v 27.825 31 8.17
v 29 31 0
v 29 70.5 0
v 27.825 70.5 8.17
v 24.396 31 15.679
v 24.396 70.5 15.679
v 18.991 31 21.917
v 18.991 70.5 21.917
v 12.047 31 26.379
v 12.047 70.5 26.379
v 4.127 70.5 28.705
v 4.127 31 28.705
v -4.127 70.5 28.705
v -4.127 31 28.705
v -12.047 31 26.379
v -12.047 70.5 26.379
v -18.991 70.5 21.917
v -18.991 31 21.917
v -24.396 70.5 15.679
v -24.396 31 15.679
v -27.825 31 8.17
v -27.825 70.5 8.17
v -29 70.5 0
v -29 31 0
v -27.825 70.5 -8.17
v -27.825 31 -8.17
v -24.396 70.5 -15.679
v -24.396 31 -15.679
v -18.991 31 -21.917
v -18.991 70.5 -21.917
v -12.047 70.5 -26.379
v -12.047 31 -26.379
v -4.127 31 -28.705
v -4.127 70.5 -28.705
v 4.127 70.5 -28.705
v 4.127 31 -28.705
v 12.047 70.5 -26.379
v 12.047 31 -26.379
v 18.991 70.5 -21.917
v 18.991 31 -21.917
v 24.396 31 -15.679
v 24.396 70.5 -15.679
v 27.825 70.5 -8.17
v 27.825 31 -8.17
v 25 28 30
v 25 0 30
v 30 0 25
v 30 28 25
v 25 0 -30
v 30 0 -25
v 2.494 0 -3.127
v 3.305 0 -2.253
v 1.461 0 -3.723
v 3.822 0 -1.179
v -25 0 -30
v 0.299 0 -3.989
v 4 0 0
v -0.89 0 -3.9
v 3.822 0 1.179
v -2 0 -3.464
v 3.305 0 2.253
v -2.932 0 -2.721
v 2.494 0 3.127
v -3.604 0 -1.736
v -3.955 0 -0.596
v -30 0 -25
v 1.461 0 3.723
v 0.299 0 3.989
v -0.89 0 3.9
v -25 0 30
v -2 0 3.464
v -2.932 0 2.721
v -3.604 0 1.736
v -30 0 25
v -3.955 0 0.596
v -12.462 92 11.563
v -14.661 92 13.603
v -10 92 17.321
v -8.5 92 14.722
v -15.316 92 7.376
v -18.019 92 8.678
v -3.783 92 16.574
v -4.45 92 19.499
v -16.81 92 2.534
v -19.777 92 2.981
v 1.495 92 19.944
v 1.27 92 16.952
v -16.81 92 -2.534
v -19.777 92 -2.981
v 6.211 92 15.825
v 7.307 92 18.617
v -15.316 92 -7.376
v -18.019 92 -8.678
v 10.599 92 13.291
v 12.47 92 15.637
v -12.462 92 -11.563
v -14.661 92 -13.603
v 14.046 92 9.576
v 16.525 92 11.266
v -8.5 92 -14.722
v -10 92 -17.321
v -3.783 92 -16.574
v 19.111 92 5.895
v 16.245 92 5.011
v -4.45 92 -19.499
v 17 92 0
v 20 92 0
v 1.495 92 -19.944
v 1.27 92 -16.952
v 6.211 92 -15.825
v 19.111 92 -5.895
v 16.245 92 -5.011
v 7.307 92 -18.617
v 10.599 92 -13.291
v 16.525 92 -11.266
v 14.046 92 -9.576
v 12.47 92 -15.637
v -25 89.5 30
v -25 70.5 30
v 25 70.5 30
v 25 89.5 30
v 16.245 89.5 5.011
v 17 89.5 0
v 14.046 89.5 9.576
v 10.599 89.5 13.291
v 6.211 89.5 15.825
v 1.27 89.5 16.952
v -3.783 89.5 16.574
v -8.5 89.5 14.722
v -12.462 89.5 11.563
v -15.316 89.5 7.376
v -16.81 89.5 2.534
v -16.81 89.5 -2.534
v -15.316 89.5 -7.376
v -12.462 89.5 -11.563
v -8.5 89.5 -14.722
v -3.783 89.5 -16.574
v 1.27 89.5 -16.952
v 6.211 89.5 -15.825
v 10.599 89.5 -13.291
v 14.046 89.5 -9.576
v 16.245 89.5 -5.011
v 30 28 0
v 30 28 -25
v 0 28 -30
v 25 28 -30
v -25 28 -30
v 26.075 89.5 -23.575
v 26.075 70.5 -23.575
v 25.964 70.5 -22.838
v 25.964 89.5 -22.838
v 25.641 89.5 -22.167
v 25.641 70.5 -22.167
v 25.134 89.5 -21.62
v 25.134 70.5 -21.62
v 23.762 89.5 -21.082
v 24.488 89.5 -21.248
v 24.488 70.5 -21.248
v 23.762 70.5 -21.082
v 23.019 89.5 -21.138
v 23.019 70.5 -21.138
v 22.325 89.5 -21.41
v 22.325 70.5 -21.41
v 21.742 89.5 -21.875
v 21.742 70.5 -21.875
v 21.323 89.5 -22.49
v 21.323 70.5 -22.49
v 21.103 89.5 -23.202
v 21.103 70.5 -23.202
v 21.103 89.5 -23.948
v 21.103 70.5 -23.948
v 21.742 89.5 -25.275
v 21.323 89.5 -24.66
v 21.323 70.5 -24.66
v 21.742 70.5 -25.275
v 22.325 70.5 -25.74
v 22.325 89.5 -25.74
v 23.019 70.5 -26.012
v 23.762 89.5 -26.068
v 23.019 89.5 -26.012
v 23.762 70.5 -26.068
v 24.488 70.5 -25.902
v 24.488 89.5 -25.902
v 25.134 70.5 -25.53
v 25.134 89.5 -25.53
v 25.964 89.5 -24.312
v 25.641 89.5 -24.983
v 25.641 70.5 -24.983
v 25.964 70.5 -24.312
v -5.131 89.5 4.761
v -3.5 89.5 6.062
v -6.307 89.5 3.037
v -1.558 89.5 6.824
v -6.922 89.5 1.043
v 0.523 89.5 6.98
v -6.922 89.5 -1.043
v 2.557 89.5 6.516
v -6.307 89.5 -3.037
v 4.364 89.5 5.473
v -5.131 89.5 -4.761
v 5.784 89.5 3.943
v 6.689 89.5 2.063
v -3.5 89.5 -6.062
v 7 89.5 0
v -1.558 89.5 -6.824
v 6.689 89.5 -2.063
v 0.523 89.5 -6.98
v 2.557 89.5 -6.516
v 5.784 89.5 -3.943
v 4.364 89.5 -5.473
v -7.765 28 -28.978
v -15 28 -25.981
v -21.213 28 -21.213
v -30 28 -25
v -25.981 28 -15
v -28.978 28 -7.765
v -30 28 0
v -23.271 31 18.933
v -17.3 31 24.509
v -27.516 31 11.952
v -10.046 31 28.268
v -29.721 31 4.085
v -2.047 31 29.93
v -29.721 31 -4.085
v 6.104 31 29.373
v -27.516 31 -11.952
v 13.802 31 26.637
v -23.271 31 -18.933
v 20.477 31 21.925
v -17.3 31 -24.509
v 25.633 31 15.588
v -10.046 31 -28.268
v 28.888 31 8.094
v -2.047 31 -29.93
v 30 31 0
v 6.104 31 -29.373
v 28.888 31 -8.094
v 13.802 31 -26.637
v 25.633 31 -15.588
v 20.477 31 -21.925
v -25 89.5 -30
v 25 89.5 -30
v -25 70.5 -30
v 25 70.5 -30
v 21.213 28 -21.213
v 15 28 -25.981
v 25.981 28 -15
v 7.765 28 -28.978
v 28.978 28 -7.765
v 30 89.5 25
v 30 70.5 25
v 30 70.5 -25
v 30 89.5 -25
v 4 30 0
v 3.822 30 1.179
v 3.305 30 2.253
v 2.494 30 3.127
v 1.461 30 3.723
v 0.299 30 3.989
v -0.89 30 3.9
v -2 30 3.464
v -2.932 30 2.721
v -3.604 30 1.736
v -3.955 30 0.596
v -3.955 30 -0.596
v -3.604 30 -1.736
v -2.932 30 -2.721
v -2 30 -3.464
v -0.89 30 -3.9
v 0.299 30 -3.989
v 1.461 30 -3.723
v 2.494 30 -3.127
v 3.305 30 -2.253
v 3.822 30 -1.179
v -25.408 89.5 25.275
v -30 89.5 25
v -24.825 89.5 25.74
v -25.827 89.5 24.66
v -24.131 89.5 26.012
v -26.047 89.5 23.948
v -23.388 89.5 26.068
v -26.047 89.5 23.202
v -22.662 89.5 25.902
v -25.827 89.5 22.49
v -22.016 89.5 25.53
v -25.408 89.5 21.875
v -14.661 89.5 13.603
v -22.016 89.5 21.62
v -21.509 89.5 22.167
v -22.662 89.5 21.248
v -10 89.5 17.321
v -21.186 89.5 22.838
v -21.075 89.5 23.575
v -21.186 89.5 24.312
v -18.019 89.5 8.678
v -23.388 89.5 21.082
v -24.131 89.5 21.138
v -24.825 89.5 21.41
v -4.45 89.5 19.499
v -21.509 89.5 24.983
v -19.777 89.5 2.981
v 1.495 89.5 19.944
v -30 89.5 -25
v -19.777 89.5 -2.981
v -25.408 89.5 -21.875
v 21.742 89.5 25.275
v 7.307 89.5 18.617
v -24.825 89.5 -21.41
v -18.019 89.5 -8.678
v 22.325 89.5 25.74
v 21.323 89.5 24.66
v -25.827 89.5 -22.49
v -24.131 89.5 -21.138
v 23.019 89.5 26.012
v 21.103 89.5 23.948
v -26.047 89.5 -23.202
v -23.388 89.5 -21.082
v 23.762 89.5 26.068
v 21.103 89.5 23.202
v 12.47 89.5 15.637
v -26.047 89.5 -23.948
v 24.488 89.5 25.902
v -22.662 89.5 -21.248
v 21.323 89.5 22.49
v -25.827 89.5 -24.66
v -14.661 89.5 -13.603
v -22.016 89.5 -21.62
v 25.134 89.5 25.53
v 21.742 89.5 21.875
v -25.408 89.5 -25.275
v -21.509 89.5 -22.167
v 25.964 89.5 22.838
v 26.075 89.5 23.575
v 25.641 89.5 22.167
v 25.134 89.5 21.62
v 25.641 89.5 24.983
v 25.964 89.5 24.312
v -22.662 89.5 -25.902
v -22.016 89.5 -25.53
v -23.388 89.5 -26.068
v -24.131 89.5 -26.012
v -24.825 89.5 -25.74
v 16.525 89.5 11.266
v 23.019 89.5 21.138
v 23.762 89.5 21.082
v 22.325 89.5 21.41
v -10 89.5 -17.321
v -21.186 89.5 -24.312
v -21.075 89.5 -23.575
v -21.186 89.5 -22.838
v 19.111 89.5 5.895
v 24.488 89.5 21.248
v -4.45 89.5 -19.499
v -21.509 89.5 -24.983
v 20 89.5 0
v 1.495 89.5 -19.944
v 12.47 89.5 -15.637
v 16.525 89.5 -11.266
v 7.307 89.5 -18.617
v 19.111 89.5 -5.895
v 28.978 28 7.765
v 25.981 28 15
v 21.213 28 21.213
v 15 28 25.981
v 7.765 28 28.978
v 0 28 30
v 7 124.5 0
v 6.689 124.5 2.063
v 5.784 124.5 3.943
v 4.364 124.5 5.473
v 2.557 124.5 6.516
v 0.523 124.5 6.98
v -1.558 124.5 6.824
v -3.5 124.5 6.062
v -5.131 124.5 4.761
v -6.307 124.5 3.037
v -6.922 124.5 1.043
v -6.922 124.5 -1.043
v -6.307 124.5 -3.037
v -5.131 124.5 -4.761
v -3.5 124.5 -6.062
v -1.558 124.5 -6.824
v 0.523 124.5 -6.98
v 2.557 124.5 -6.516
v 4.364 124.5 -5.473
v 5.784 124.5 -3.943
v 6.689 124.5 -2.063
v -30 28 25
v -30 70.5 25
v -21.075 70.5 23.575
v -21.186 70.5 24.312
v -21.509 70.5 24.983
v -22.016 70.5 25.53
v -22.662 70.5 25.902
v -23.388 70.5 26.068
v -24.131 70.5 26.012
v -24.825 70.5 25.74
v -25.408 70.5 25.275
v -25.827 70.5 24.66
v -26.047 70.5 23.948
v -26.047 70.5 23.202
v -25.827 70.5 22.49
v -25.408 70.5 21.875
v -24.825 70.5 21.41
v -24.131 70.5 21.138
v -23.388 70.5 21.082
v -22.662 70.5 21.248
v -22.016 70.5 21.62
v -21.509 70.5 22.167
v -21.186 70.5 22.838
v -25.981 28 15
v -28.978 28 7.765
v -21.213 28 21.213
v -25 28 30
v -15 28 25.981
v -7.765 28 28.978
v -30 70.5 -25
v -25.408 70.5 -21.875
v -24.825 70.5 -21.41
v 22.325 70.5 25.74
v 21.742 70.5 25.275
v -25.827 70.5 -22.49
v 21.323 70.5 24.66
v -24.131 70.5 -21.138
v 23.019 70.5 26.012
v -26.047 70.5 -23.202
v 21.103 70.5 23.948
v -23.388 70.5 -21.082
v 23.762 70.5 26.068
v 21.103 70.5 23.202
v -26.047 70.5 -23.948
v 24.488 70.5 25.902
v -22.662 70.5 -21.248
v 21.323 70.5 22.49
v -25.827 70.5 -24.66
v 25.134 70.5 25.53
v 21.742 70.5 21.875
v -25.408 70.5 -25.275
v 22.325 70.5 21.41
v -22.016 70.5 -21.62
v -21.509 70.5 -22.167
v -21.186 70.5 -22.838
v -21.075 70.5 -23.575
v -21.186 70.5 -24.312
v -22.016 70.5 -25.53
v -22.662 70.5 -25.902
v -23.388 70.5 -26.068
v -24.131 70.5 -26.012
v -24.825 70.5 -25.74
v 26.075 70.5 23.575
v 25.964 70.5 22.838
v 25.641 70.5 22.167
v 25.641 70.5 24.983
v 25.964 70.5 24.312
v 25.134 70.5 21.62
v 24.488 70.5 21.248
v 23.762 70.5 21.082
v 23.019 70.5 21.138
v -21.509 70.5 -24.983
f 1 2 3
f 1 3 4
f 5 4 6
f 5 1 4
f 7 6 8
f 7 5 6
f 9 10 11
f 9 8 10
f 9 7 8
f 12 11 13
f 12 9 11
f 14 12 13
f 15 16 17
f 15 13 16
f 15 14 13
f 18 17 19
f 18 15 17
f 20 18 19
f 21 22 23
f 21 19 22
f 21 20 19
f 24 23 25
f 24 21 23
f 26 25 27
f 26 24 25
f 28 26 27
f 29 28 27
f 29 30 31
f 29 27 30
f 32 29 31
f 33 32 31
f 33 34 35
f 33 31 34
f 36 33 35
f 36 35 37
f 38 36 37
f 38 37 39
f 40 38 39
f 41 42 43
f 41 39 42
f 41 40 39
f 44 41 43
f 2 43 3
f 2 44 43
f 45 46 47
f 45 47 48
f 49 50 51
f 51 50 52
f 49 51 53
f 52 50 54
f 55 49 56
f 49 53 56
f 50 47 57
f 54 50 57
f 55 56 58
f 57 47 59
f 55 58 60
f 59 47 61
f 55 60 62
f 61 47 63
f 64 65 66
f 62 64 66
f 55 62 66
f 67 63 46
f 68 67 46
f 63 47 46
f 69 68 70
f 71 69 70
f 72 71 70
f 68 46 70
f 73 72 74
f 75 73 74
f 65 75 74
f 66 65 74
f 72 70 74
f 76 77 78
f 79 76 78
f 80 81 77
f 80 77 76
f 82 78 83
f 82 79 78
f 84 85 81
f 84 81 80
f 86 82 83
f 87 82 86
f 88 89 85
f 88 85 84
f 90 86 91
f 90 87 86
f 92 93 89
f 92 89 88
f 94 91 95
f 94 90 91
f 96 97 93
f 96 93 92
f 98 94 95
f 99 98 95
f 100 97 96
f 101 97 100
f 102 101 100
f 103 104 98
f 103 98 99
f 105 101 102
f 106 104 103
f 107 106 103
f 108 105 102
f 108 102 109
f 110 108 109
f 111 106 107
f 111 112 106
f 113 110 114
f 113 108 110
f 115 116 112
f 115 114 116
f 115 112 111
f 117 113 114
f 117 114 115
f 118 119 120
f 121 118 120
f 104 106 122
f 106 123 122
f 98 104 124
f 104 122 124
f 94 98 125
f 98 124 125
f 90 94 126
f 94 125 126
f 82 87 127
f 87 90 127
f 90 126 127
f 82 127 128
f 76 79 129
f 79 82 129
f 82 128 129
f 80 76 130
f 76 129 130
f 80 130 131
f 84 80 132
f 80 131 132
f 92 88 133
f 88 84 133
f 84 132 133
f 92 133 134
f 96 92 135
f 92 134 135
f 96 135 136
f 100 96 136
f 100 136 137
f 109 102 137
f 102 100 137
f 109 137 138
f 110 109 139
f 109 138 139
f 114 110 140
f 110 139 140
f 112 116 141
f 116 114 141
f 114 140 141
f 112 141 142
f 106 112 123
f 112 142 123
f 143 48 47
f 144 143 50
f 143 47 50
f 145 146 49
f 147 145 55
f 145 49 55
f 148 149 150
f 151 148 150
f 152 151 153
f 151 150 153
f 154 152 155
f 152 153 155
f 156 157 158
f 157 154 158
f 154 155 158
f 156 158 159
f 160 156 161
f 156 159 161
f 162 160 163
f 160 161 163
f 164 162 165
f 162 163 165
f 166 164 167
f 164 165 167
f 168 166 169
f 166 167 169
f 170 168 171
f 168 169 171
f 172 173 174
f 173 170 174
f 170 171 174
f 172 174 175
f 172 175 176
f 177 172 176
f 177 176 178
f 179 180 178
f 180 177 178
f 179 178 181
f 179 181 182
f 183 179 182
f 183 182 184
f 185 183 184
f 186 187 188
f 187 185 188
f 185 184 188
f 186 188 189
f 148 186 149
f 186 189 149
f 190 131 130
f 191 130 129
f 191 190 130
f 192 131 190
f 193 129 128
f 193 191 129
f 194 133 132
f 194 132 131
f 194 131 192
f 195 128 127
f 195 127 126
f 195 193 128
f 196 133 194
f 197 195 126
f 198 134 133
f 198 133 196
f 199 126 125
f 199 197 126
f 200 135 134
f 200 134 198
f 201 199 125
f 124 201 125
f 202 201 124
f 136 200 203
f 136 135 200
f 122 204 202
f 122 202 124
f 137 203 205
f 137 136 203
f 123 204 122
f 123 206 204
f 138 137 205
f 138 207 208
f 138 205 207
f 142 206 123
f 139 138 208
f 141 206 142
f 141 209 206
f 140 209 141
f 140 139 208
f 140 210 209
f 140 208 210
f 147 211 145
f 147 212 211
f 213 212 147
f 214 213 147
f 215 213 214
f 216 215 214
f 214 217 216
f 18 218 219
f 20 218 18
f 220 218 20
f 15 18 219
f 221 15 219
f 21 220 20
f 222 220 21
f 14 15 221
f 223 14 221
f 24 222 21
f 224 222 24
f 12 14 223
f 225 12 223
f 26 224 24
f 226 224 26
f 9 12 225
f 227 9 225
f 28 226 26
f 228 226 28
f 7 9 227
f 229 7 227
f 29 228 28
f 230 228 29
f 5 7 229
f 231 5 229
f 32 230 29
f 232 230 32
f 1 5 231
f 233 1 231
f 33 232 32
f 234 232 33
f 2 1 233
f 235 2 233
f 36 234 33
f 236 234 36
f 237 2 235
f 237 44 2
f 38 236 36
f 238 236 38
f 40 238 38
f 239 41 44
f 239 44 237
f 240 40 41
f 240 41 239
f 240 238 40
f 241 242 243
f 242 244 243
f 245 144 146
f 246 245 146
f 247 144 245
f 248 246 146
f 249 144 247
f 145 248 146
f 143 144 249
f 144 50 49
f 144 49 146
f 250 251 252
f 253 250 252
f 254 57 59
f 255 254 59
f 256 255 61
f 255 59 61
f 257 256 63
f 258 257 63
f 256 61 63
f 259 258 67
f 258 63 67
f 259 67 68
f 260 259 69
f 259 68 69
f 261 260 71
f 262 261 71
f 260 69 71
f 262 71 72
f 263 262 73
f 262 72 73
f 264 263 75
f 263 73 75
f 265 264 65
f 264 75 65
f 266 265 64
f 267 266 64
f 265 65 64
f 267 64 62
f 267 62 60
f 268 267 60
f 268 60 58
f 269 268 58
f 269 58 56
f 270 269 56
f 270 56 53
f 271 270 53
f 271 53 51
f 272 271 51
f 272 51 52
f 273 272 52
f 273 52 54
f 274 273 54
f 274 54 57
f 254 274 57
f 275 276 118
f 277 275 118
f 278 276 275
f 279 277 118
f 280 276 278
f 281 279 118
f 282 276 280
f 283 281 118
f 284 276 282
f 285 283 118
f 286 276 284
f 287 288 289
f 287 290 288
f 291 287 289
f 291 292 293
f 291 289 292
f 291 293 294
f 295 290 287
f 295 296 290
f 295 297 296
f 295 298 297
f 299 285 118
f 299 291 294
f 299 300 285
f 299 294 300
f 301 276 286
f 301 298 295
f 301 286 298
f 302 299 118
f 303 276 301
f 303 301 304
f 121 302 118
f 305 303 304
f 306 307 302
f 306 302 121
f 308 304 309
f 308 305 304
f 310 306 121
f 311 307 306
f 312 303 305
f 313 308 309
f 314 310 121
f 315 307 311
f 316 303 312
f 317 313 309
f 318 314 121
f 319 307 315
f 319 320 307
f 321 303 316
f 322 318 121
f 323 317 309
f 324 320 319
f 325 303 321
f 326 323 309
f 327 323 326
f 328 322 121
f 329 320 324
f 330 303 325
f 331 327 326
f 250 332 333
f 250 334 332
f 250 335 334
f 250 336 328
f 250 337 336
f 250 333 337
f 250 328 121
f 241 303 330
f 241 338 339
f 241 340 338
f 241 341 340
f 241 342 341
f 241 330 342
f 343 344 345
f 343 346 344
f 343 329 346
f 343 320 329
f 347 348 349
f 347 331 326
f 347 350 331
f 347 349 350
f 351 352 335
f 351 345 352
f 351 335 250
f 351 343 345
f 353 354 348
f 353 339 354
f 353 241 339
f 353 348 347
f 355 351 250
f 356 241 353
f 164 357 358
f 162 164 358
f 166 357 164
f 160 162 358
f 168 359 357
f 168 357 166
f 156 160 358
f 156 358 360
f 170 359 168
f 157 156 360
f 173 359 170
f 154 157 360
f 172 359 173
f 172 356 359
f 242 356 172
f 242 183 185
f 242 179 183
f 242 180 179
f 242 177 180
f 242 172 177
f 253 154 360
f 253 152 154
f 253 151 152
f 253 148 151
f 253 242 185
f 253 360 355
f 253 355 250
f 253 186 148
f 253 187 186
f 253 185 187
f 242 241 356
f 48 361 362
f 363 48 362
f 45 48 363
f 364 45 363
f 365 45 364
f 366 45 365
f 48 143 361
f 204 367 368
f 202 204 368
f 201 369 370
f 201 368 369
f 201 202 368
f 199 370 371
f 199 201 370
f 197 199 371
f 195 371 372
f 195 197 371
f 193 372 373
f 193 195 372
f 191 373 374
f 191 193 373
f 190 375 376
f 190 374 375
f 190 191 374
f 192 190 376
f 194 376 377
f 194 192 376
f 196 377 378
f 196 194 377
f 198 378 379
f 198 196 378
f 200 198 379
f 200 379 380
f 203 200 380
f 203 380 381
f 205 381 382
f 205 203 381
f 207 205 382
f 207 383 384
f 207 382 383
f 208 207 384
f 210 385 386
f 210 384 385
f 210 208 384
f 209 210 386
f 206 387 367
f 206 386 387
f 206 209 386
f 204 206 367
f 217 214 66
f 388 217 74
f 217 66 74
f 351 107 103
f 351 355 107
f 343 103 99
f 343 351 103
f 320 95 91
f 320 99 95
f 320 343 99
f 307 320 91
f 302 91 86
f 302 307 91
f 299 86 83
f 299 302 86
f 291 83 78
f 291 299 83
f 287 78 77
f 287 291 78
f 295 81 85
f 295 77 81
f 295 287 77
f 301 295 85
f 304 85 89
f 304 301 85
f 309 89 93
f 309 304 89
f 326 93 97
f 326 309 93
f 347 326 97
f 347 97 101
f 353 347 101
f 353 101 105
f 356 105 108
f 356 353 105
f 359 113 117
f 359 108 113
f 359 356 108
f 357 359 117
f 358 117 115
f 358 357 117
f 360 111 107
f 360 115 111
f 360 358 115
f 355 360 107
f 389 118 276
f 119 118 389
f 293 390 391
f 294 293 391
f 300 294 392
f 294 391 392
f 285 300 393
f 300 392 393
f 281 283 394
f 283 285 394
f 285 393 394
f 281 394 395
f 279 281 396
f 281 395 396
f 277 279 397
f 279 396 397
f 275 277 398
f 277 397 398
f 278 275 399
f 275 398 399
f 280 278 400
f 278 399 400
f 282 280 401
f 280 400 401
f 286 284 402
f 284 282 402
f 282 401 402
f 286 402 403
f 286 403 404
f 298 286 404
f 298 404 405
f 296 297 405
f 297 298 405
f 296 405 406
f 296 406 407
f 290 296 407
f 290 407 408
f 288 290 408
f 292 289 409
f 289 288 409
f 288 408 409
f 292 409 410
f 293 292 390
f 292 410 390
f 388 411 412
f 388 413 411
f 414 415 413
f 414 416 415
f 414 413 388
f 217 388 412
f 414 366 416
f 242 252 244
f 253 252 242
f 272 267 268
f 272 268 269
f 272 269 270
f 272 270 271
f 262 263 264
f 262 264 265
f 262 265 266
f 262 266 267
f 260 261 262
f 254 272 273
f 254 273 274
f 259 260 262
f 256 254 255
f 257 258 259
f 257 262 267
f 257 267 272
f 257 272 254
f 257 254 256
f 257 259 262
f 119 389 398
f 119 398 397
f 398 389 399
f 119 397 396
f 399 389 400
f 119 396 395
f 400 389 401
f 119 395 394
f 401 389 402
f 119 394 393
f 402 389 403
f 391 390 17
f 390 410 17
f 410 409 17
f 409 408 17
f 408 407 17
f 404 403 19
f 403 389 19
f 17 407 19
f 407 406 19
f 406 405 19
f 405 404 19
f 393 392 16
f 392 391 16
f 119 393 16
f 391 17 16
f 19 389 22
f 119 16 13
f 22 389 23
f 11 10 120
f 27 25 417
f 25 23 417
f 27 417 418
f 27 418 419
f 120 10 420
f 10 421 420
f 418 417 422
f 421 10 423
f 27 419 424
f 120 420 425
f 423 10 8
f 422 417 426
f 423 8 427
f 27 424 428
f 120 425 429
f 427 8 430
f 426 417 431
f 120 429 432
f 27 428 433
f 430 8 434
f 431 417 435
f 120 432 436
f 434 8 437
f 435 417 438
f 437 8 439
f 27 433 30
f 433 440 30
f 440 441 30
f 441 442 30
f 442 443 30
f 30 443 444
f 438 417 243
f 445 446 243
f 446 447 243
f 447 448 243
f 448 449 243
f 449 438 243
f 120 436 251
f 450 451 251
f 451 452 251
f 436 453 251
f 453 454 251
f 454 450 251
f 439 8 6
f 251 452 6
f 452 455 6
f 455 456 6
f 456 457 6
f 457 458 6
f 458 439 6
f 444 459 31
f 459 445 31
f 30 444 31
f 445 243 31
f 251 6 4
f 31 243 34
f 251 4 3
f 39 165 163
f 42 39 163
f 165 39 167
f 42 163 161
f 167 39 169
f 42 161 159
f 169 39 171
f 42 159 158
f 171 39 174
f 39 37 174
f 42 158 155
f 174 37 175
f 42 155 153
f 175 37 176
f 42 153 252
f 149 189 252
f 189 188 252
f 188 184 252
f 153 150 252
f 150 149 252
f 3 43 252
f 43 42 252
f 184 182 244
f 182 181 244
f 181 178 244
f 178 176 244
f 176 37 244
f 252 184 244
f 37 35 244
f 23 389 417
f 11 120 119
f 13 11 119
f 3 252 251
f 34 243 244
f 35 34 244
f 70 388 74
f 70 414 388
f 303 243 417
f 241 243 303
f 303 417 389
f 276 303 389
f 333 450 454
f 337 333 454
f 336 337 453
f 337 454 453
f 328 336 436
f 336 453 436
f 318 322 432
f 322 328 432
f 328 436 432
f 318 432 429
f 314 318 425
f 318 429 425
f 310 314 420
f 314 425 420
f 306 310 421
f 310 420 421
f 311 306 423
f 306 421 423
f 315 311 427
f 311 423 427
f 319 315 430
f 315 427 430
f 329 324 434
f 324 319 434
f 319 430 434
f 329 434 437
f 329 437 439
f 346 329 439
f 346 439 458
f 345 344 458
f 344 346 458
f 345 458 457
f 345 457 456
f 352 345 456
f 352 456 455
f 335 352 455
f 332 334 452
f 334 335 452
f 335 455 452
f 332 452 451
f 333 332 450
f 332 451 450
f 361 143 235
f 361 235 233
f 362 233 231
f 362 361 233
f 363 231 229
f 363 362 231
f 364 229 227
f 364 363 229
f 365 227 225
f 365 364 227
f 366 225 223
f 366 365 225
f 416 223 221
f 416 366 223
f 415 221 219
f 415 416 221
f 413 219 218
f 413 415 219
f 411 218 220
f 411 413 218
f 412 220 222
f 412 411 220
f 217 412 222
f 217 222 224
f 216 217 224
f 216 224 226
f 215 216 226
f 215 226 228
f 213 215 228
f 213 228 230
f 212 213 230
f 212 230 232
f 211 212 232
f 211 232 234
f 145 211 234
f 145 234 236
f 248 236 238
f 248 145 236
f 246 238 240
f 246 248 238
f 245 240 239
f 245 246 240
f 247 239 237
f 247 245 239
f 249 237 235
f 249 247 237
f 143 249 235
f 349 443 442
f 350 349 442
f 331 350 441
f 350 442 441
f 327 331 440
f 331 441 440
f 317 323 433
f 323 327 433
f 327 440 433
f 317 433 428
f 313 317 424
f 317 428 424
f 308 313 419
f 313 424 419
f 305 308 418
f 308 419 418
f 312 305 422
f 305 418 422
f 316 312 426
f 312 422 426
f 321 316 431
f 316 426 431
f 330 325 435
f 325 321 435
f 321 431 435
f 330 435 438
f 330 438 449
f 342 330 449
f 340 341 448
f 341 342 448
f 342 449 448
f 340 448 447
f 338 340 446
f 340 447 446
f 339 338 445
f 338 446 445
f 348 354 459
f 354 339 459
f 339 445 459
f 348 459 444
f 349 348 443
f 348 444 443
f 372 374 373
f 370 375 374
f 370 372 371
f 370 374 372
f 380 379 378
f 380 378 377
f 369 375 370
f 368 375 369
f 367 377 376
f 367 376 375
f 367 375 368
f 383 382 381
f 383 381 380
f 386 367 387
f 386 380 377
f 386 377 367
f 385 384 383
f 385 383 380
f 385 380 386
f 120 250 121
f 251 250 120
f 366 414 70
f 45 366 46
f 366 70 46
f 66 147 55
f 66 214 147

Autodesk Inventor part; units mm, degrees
ref_plane "YZ Plane" through (0, 0, 0) normal (1, 0, 0) x (0, 1, 0)
ref_plane "XZ Plane" through (0, 0, 0) normal (0, 1, 0) x (-1, 0, 0)
ref_plane "XY Plane" through (0, 0, 0) normal (0, 0, 1) x (1, 0, 0)
sketch "Sketch1" plane through (0, 0, 0) normal (0, 1, 0) x (-1, 0, 0)
  line L0 (30, 30) -> (-30, 30)
  line L1 (-30, 30) -> (-30, -30)
  line L2 (-30, -30) -> (30, -30)
  line L3 (30, -30) -> (30, 30)
  line L4 (30, 30) -> (-30, -30) construction
  line L5 (-30, 30) -> (30, -30) construction
  circle A0 centre (0, 0) radius 29
  circle A1 centre (0, 0) radius 30
  point P0 (0, 0)
  dimension "d0" = 60
  dimension "d1" = 60
  dimension "d2" = 58
extrude "Extrusion1" add sketch "Sketch1" along normal blind 28 contours L3 A1 L0 | A1 L1 L0 | A1 | L3 L2 A1 | A1 L2 L1 | A0
sketch "Sketch2" plane through (0, 28, 0) normal (0, 1, 0) x (1, 0, 0)
  circle A0 centre (0, 0) radius 30
extrude "Extrusion2" add sketch "Sketch2" along normal blind 3
sketch "Sketch3" plane through (0, 31, 0) normal (0, 1, 0) x (1, 0, 0)
  circle A0 centre (0, 0) radius 29
  dimension "d7" = 58
extrude "Extrusion3" add sketch "Sketch3" along normal blind 39.5
sketch "Sketch4" plane through (0, 70.5, 0) normal (0, 1, 0) x (1, 0, 0)
  line L0 (-30, -30) -> (30, -30) projected
  line L1 (30, -30) -> (30, 30) projected
  line L2 (-30, -30) -> (30, -30)
  line L3 (30, -30) -> (30, 30)
  line L4 (30, 30) -> (-30, 30)
  line L5 (-30, 30) -> (-30, -30)
  line L6 (30, 30) -> (-30, 30) construction
  line L7 (-30, -30) -> (30, 30) construction
  line L8 (30, -30) -> (-30, 30) construction
  circle A0 centre (-23.575, -23.575) radius 2.5
  circle A1 centre (-23.575, 23.575) radius 2.5
  circle A2 centre (23.575, 23.575) radius 2.5
  circle A3 centre (23.575, -23.575) radius 2.5
  line L9 (-23.575, -23.575) -> (-23.575, 23.575) construction
  point P0 (0, 0)
  dimension "d10" = 5
  dimension "d11" = 5
  dimension "d12" = 47.15
  dimension "d13" = 5
  dimension "d14" = 5
  dimension "d15" = 47.15
  dimension "d16" = 47.15
  dimension "d17" = 47.15
sketch "Sketch5" plane through (-30, 0, 30) normal (0, 0, 1) x (1, 0, 0)
  line L0 (0, 0) -> (0, 28) construction
  line L1 (0, 70.5) -> (0, 0) construction
  line L2 (59, 70.5) -> (1, 70.5) projected
  point P0 (30, 0)
  dimension "d21" = 70.5
extrude "Extrusion4" add sketch "Sketch4" along normal blind 19
sketch "Sketch6" plane through (0, 89.5, 0) normal (0, 1, 0) x (1, 0, 0)
  circle A0 centre (0, 0) radius 20
  circle A1 centre (0, 0) radius 17
  circle A2 centre (0, 0) radius 7
  dimension "d22" = 14
  dimension "d23" = 40
  dimension "d24" = 3
extrude "Extrusion5" add sketch "Sketch6" along normal blind 2.5 contours A0
sketch "Sketch7" plane through (0, 89.5, 0) normal (0, 1, 0) x (1, 0, 0)
  circle A0 centre (0, 0) radius 7
  dimension "d27" = 14
extrude "Extrusion6" add sketch "Sketch7" along normal blind 35
chamfer "Chamfer1" distance 5 angle 45 8 edges at (-30, 80, 30) (30, 80, 30) (-30, 14, 30) (30, 14, 30) (30, 80, -30) (-30, 80, -30) (-30, 14, -30) (30, 14, -30)
sketch "Sketch8" plane through (0, 0, 0) normal (0, -1, 0) x (1, 0, 0)
  circle A0 centre (0, 0) radius 4
  dimension "d33" = 8
extrude "Extrusion7" cut sketch "Sketch8" against normal blind 30
equation "\"d1\" = d0"
equation "\"d15\" = d12"
equation "\"d16\" = d12"
equation "\"d17\" = d12"
properties part number "Gearbox"
